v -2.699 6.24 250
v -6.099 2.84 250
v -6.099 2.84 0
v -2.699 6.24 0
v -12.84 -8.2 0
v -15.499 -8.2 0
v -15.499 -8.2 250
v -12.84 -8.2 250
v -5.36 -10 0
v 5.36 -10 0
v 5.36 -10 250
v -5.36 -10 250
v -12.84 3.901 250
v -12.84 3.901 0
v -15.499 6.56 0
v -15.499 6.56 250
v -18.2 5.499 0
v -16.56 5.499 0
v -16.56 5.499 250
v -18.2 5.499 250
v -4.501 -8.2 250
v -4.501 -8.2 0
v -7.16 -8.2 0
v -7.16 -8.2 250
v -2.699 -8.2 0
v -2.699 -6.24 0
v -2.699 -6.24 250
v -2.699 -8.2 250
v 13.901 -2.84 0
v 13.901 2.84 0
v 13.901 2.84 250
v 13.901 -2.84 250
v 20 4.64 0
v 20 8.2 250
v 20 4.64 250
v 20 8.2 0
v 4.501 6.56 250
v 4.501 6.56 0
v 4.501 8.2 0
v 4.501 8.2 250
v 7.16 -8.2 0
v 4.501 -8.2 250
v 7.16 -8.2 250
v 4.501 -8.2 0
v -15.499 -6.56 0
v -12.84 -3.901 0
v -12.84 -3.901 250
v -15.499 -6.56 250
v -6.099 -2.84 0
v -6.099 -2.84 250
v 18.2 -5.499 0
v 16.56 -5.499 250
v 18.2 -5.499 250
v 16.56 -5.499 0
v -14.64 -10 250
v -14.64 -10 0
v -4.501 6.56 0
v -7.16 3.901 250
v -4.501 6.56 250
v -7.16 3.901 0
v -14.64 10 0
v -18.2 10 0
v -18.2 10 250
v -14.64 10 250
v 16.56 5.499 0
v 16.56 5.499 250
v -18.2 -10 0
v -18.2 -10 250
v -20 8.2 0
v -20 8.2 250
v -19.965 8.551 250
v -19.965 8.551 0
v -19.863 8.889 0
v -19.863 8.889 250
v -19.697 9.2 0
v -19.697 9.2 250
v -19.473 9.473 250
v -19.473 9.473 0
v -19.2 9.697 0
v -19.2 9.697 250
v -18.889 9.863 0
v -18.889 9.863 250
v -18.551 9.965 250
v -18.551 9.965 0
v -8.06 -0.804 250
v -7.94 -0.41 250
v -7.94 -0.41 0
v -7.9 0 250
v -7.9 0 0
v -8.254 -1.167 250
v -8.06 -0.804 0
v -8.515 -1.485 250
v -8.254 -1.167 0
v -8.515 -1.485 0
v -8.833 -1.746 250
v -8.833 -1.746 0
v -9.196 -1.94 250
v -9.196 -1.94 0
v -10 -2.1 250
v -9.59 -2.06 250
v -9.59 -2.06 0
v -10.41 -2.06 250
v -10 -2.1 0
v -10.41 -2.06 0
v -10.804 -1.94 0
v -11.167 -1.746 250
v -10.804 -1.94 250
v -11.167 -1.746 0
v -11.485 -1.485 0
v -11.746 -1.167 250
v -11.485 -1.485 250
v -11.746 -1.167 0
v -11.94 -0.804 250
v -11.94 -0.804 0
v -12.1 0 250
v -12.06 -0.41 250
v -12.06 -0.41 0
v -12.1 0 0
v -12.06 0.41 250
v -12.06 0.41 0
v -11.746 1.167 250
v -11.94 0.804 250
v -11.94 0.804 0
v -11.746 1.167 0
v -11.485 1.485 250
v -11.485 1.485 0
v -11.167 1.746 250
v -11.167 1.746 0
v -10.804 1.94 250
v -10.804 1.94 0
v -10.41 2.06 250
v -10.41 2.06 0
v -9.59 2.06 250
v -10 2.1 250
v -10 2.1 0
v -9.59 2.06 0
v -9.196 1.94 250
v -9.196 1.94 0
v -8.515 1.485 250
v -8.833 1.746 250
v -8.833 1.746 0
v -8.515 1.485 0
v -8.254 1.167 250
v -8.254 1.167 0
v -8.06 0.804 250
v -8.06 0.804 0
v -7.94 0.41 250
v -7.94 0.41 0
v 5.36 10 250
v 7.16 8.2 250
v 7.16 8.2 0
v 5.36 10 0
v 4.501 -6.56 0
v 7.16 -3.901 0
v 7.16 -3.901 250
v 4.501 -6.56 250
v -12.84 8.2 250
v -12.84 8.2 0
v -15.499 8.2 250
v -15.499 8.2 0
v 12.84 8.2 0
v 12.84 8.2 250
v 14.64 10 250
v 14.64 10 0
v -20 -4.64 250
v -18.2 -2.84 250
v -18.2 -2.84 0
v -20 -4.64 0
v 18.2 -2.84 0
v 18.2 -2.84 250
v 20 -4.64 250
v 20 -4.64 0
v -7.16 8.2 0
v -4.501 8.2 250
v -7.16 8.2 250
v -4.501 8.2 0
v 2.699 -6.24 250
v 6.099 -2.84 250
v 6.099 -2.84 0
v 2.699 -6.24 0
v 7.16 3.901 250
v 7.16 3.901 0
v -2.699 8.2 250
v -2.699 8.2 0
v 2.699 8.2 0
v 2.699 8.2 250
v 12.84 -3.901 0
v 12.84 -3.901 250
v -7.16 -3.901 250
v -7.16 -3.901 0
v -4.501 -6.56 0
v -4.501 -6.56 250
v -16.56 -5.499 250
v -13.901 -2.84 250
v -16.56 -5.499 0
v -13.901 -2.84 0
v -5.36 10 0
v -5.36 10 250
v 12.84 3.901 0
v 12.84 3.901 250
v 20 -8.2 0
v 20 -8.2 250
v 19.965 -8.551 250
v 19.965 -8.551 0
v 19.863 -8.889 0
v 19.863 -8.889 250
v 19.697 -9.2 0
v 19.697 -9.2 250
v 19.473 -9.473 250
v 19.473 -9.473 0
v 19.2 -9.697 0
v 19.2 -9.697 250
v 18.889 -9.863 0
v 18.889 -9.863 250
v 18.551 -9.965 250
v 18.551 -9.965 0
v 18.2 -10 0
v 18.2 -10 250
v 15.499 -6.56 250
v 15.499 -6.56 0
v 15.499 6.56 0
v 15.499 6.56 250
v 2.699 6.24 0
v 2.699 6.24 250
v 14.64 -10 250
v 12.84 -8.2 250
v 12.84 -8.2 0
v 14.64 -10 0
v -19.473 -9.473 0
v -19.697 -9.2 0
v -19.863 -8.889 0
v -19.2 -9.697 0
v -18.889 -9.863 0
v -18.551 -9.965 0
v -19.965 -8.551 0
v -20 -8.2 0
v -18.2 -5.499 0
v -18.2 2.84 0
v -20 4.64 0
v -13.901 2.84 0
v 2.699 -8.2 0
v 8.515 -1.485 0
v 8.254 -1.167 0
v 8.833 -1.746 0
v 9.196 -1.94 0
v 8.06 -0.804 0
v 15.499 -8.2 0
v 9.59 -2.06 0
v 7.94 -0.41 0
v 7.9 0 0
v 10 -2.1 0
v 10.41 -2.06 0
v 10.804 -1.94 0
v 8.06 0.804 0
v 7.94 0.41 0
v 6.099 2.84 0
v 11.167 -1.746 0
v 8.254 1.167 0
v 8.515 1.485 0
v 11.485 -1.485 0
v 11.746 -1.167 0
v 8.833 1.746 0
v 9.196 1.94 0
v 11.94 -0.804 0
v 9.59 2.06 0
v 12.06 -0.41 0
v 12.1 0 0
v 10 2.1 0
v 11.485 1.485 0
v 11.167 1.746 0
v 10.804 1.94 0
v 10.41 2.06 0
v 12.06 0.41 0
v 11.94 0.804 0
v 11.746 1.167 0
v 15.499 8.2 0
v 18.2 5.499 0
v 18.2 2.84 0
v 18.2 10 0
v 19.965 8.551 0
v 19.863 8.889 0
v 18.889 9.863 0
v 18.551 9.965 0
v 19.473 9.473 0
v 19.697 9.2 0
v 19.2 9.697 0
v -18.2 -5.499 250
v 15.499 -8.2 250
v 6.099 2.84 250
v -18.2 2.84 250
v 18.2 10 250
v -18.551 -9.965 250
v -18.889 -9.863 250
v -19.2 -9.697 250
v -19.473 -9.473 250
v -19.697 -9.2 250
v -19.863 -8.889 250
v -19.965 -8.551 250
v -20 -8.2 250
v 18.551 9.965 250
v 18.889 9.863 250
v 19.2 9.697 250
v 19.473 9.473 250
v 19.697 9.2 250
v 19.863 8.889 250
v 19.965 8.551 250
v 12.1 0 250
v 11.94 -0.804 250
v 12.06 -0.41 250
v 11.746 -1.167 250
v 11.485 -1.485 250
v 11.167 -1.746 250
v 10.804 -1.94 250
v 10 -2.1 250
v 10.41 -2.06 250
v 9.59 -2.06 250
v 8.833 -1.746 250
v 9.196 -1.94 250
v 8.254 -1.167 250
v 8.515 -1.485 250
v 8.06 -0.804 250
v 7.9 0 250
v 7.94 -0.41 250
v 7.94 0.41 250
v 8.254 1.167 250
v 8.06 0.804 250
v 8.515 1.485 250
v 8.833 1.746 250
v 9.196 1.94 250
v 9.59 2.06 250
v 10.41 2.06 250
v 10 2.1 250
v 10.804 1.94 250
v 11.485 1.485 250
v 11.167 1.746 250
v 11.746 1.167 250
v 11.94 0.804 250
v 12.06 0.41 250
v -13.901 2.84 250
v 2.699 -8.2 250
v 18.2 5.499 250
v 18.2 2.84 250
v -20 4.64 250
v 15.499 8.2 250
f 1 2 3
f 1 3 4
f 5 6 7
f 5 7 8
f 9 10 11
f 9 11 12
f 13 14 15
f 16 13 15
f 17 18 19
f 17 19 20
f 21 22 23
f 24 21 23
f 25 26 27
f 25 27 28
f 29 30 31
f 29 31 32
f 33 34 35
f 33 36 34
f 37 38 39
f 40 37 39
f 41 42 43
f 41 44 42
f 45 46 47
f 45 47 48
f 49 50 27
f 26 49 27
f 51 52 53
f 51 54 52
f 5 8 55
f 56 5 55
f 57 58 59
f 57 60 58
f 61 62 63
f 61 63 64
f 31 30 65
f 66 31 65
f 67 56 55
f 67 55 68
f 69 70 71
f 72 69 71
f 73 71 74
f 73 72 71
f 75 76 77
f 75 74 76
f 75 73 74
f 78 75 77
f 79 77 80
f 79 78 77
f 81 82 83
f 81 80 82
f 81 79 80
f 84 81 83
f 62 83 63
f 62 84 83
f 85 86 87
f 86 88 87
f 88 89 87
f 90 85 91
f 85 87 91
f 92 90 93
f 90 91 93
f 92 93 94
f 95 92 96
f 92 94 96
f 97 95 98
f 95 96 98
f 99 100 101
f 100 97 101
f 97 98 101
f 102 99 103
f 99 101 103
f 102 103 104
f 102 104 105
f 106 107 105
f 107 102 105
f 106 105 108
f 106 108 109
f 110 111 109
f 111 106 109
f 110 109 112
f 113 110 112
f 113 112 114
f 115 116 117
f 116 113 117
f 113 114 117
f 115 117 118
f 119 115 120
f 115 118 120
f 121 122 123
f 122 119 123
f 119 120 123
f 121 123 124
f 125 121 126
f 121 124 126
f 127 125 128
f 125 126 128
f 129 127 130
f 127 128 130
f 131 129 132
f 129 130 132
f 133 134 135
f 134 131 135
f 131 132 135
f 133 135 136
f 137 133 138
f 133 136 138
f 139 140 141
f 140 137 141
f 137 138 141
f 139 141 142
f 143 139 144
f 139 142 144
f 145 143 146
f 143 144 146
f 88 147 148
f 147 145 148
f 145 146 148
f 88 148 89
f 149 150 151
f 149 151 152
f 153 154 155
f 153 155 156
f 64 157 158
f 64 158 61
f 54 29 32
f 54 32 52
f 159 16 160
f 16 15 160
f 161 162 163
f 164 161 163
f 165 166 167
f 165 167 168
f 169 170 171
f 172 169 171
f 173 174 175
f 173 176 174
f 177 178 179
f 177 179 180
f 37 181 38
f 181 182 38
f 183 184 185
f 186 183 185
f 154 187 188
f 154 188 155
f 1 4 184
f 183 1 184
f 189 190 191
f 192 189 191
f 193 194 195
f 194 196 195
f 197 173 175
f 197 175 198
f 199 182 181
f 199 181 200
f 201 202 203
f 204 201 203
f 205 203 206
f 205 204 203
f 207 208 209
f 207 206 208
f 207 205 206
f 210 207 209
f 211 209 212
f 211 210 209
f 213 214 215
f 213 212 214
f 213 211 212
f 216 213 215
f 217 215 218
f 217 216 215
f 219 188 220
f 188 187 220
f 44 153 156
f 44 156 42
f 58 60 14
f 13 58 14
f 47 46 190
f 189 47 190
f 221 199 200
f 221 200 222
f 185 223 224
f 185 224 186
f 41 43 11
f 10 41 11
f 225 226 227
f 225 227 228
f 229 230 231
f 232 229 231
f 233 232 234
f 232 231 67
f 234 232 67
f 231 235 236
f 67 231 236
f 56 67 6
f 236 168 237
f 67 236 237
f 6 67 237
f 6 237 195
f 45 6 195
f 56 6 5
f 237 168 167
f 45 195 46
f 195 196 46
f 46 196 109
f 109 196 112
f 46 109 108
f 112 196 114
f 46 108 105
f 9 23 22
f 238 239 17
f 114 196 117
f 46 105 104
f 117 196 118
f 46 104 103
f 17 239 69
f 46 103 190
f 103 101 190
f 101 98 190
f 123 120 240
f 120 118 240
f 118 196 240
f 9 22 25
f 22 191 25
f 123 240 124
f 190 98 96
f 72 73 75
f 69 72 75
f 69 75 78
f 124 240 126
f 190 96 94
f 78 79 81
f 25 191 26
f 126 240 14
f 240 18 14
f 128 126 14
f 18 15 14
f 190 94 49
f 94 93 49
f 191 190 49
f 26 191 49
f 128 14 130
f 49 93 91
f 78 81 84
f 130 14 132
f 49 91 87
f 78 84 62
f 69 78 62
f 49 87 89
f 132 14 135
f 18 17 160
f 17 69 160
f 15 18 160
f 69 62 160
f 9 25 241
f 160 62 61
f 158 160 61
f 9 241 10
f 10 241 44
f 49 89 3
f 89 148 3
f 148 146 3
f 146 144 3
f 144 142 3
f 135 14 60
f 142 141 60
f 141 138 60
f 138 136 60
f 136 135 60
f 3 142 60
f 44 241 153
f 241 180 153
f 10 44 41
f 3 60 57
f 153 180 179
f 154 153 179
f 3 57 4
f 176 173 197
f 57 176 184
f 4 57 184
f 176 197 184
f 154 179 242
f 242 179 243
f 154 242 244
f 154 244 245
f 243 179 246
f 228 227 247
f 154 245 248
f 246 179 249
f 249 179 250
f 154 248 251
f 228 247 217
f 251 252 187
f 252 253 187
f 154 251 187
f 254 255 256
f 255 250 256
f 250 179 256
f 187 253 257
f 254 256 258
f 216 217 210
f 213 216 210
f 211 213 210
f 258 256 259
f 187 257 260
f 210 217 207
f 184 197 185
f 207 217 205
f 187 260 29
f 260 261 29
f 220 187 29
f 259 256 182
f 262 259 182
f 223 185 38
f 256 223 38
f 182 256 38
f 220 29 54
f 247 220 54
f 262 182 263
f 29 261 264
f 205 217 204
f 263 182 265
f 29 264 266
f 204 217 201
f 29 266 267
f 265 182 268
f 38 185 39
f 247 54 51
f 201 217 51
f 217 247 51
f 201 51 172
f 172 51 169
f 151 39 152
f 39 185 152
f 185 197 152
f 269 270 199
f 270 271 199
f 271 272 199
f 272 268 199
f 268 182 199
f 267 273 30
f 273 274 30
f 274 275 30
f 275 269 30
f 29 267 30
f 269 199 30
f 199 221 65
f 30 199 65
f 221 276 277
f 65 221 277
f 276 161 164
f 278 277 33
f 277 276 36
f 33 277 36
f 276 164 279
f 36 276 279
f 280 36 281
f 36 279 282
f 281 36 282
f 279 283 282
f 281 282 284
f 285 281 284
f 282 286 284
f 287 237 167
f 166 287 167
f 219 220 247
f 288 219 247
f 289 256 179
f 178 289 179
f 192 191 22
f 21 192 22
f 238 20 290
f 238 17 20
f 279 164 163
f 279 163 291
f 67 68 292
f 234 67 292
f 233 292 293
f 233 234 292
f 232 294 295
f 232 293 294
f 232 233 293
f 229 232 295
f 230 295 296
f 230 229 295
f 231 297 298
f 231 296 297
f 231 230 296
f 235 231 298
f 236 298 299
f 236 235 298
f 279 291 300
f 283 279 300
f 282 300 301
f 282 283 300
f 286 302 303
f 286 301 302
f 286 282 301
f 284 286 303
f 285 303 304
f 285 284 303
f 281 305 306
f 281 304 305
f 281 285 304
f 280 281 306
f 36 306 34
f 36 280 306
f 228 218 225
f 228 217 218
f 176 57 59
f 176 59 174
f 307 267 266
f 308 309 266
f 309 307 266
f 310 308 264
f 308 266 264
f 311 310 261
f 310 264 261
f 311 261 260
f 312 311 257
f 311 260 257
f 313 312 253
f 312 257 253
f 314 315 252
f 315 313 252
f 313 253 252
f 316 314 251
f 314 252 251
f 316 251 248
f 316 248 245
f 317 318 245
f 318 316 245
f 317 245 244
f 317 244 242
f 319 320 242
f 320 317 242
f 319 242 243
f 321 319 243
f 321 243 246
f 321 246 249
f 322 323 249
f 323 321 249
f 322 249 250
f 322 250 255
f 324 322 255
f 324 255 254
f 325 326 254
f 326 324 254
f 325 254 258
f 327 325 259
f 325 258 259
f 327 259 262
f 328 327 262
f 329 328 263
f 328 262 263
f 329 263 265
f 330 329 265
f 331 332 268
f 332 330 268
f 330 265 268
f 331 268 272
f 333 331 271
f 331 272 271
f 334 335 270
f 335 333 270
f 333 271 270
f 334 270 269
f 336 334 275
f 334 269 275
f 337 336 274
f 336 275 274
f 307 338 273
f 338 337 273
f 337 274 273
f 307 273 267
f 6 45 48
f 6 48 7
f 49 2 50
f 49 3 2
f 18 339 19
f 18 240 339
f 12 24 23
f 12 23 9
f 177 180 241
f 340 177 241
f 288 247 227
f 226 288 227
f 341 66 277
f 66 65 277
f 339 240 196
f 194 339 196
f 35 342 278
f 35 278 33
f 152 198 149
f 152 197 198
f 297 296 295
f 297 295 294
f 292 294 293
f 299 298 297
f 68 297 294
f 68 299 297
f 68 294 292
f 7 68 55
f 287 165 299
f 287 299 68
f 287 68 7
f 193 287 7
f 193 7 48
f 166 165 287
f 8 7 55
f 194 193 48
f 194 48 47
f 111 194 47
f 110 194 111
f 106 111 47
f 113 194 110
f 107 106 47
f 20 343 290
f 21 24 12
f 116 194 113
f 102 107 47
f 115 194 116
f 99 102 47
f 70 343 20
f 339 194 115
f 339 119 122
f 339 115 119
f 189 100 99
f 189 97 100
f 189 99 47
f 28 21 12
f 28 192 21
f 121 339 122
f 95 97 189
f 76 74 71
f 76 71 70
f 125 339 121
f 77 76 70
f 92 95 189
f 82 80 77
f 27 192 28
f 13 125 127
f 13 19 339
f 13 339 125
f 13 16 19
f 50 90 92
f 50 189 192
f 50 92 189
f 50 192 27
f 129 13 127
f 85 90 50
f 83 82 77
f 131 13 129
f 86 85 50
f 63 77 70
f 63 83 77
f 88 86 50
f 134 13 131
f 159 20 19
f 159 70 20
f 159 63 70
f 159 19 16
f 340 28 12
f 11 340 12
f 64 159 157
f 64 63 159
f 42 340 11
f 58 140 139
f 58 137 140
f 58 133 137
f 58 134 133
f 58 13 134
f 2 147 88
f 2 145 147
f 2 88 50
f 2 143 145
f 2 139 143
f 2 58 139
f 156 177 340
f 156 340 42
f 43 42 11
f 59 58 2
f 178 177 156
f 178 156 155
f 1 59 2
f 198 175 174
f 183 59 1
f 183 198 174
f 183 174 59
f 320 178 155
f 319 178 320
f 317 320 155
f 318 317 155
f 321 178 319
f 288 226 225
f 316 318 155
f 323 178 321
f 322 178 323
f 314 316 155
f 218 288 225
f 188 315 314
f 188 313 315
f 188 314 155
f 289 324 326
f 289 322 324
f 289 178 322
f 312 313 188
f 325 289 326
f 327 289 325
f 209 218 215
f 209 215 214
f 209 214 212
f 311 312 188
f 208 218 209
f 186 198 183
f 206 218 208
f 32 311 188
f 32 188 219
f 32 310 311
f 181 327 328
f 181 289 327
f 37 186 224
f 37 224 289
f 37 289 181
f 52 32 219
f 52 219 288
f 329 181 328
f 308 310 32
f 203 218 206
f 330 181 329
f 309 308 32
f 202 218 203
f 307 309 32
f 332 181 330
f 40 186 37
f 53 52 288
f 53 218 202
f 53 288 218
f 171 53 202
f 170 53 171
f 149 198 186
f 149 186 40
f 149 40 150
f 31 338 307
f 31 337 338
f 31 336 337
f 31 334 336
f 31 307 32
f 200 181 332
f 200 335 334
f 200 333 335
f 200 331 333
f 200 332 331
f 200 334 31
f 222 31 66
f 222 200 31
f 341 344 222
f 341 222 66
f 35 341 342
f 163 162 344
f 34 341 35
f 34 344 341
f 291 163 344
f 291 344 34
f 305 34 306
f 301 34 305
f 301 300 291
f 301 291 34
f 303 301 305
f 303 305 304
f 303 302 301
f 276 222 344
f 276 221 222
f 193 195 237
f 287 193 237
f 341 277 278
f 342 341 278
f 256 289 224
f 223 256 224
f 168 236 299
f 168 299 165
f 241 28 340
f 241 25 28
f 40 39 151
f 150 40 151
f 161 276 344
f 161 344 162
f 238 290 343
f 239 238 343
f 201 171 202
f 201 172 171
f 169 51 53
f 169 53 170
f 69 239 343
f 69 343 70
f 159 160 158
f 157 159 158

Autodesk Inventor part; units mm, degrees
ref_plane "YZ Plane" through (0, 0, 0) normal (1, 0, 0) x (0, 1, 0)
ref_plane "Start Plane" through (0, 0, 0) normal (0, 0, 1) x (1, 0, 0)
ref_plane "End Plane" through (0, 0, 10) normal (0, 0, 1) x (1, 0, 0)
sketch "Sketch3" plane through (0, 0, 0) normal (0, 0, 1) x (1, 0, 0)
  line L0 (0, 0) -> (0, 10) construction
  line L1 (-10, 10) -> (-10, 0) construction
  line L2 (0, 0) -> (-10, 0) construction
  circle A0 centre (-10, 0) radius 2.1
  line L3 (-13.9007, 3.9007) -> (-6.0993, 3.9007) construction
  line L4 (-6.0993, 3.9007) -> (-6.0993, -3.9007) construction
  line L5 (-6.0993, -3.9007) -> (-13.9007, -3.9007) construction
  line L6 (-13.9007, -3.9007) -> (-13.9007, 3.9007) construction
  line L7 (-13.9007, 3.9007) -> (-6.0993, -3.9007) construction
  line L8 (-6.0993, 3.9007) -> (-13.9007, -3.9007) construction
  line L9 (-13.9007, -2.84) -> (-12.84, -3.9007) construction
  line L10 (-13.9007, -2.84) -> (-12.4007, -2.84) construction
  line L11 (-12.84, -3.9007) -> (-15.4993, -6.56)
  line L12 (-15.4993, -6.56) -> (-15.4993, -8.2)
  line L13 (-15.4993, -8.2) -> (-12.84, -8.2)
  line L14 (-12.84, -8.2) -> (-14.64, -10)
  line L15 (-7.16, -3.9007) -> (-4.5007, -6.56)
  line L16 (-4.5007, -6.56) -> (-4.5007, -8.2)
  line L17 (-4.5007, -8.2) -> (-7.16, -8.2)
  line L18 (-7.16, -8.2) -> (-5.36, -10)
  line L19 (-12.84, -3.9007) -> (-7.16, -3.9007)
  line L20 (-12.84, 3.9007) -> (-13.9007, 2.84) construction
  line L21 (-12.84, 3.9007) -> (-12.84, 2.4007) construction
  line L22 (-13.9007, 2.84) -> (-16.56, 5.4993)
  line L23 (-16.56, 5.4993) -> (-18.2, 5.4993)
  line L24 (-18.2, 5.4993) -> (-18.2, 2.84)
  line L25 (-18.2, 2.84) -> (-20, 4.64)
  line L26 (-18.2, -2.84) -> (-20, -4.64)
  line L27 (-18.2, -5.4993) -> (-18.2, -2.84)
  line L28 (-16.56, -5.4993) -> (-18.2, -5.4993)
  line L29 (-13.9007, -2.84) -> (-16.56, -5.4993)
  line L30 (-13.9007, 2.84) -> (-13.9007, -2.84)
  line L31 (-6.0993, 2.84) -> (-7.16, 3.9007) construction
  line L32 (-6.0993, 2.84) -> (-7.5993, 2.84) construction
  line L33 (-7.16, 3.9007) -> (-4.5007, 6.56)
  line L34 (-4.5007, 6.56) -> (-4.5007, 8.2)
  line L35 (-4.5007, 8.2) -> (-7.16, 8.2)
  line L36 (-7.16, 8.2) -> (-5.36, 10)
  line L37 (-12.84, 8.2) -> (-14.64, 10)
  line L38 (-15.4993, 8.2) -> (-12.84, 8.2)
  line L39 (-15.4993, 6.56) -> (-15.4993, 8.2)
  line L40 (-12.84, 3.9007) -> (-15.4993, 6.56)
  line L41 (-7.16, 3.9007) -> (-12.84, 3.9007)
  line L42 (-6.0993, 2.84) -> (-2.6993, 6.24)
  line L43 (-2.6993, 6.24) -> (-2.6993, 8.2)
  line L44 (-4.5007, 8.2) -> (0, 8.2) construction
  line L45 (-6.0993, -2.84) -> (-2.6993, -6.24)
  line L46 (-2.6993, -6.24) -> (-2.6993, -8.2)
  line L47 (10, 10) -> (10, 0) construction
  circle A1 centre (10, 0) radius 2.1
  line L48 (13.9007, 3.9007) -> (6.0993, -3.9007) construction
  line L49 (13.9007, -2.84) -> (12.84, -3.9007) construction
  line L50 (12.84, -3.9007) -> (15.4993, -6.56)
  line L51 (15.4993, -6.56) -> (15.4993, -8.2)
  line L52 (15.4993, -8.2) -> (12.84, -8.2)
  line L53 (12.84, -8.2) -> (14.64, -10)
  line L54 (7.16, -8.2) -> (5.36, -10)
  line L55 (4.5007, -8.2) -> (7.16, -8.2)
  line L56 (4.5007, -6.56) -> (4.5007, -8.2)
  line L57 (7.16, -3.9007) -> (4.5007, -6.56)
  line L58 (12.84, -3.9007) -> (7.16, -3.9007)
  line L59 (13.9007, 2.84) -> (13.9007, -2.84)
  line L60 (13.9007, 2.84) -> (16.56, 5.4993)
  line L61 (16.56, 5.4993) -> (18.2, 5.4993)
  line L62 (18.2, 5.4993) -> (18.2, 2.84)
  line L63 (18.2, 2.84) -> (20, 4.64)
  line L64 (18.2, -5.4993) -> (18.2, -2.84)
  line L65 (18.2, -2.84) -> (20, -4.64)
  line L66 (16.56, -5.4993) -> (18.2, -5.4993)
  line L67 (13.9007, -2.84) -> (16.56, -5.4993)
  line L68 (7.16, 3.9007) -> (12.84, 3.9007)
  line L69 (7.16, 3.9007) -> (4.5007, 6.56)
  line L70 (4.5007, 6.56) -> (4.5007, 8.2)
  line L71 (4.5007, 8.2) -> (7.16, 8.2)
  line L72 (7.16, 8.2) -> (5.36, 10)
  line L73 (15.4993, 8.2) -> (12.84, 8.2)
  line L74 (12.84, 8.2) -> (14.64, 10)
  line L75 (15.4993, 6.56) -> (15.4993, 8.2)
  line L76 (12.84, 3.9007) -> (15.4993, 6.56)
  line L77 (6.0993, 2.84) -> (2.6993, 6.24)
  line L78 (2.6993, 6.24) -> (2.6993, 8.2)
  line L79 (6.0993, -2.84) -> (2.6993, -6.24)
  line L80 (2.6993, -6.24) -> (2.6993, -8.2)
  line L81 (-14.64, -10) -> (-18.2, -10)
  line L82 (-20, -8.2) -> (-20, -4.64)
  line L83 (-20, 4.64) -> (-20, 8.2)
  line L84 (-18.2, 10) -> (-14.64, 10)
  line L85 (18.2, -10) -> (14.64, -10)
  line L86 (5.36, -10) -> (-5.36, -10)
  line L87 (-5.36, 10) -> (5.36, 10)
  line L88 (14.64, 10) -> (18.2, 10)
  line L89 (20, 8.2) -> (20, 4.64)
  line L90 (20, -4.64) -> (20, -8.2)
  line L91 (-2.6993, -8.2) -> (2.6993, -8.2)
  line L92 (-2.6993, 8.2) -> (2.6993, 8.2)
  line L93 (-6.0993, 2.84) -> (-6.0993, -2.84)
  line L94 (6.0993, 2.84) -> (6.0993, -2.84)
  arc A2 (-20, -8.2) -> (-18.2, -10) centre (-18.2, -8.2) ccw
  arc A3 (-18.2, 10) -> (-20, 8.2) centre (-18.2, 8.2) ccw
  arc A4 (18.2, -10) -> (20, -8.2) centre (18.2, -8.2) ccw
  arc A5 (20, 8.2) -> (18.2, 10) centre (18.2, 8.2) ccw
  point P0 (-13.9007, -3.9007)
  point P1 (-13.9007, 3.9007)
  point P2 (-13.9007, 3.9007)
  point P3 (-6.0993, 3.9007)
  point P4 (6.0993, 3.9007)
  point P5 (13.9007, -3.9007)
  point P6 (12.4007, -2.84)
  point P7 (13.9007, -3.9007)
  point P8 (13.9007, 3.9007)
  point P9 (12.84, 3.9007)
  point P10 (12.84, 2.4007)
  point P11 (13.9007, 3.9007)
  point P12 (6.0993, 3.9007)
  point P13 (7.5993, 2.84)
  point P14 (-20, 10)
  point P15 (20, -10)
  point P16 (20, 10)
  point P17 (-20, -10)
  dimension "d26" = 10
  dimension "d27" = 10
  dimension "d28" = 4.2
  dimension "d29" = 1.5
  dimension "d30" = 45
  dimension "d32" = 45
  dimension "d33" = 1.64
  dimension "d34" = 1.8
  dimension "d35" = 10
  dimension "d36" = 5.68
  dimension "d39" = 180
  dimension "d41" = 1.96
  dimension "d42" = 5.68
  dimension "d45" = 1.8
extrude "Body" add sketch "Sketch3" along normal blind 250
sketch "Sketch4" plane through (0, 0, 0) normal (0, 0, 1) x (1, 0, 0)
  line L0 (0, 0) -> (10, 0)
ref_plane "Work Plane3" through (0, 0, 0) normal (0, -1, 0) x (1, 0, 0)
sketch "Sketch5" plane through (0, 0, 0) normal (0, -1, 0) x (1, 0, 0)
  line L0 (-2, 0) -> (12, 0)
  line L1 (-2, 10) -> (12, 10)
  dimension "d51" = 10
equation "\"d42\" = d36"
equation "\"G_OFFSET_START\" = 0"
equation "\"G_OFFSET_END\" = 0"
equation "\"G_L\" = d51"
properties part number "vslot 20 x 40" material "Aluminum 6061"
